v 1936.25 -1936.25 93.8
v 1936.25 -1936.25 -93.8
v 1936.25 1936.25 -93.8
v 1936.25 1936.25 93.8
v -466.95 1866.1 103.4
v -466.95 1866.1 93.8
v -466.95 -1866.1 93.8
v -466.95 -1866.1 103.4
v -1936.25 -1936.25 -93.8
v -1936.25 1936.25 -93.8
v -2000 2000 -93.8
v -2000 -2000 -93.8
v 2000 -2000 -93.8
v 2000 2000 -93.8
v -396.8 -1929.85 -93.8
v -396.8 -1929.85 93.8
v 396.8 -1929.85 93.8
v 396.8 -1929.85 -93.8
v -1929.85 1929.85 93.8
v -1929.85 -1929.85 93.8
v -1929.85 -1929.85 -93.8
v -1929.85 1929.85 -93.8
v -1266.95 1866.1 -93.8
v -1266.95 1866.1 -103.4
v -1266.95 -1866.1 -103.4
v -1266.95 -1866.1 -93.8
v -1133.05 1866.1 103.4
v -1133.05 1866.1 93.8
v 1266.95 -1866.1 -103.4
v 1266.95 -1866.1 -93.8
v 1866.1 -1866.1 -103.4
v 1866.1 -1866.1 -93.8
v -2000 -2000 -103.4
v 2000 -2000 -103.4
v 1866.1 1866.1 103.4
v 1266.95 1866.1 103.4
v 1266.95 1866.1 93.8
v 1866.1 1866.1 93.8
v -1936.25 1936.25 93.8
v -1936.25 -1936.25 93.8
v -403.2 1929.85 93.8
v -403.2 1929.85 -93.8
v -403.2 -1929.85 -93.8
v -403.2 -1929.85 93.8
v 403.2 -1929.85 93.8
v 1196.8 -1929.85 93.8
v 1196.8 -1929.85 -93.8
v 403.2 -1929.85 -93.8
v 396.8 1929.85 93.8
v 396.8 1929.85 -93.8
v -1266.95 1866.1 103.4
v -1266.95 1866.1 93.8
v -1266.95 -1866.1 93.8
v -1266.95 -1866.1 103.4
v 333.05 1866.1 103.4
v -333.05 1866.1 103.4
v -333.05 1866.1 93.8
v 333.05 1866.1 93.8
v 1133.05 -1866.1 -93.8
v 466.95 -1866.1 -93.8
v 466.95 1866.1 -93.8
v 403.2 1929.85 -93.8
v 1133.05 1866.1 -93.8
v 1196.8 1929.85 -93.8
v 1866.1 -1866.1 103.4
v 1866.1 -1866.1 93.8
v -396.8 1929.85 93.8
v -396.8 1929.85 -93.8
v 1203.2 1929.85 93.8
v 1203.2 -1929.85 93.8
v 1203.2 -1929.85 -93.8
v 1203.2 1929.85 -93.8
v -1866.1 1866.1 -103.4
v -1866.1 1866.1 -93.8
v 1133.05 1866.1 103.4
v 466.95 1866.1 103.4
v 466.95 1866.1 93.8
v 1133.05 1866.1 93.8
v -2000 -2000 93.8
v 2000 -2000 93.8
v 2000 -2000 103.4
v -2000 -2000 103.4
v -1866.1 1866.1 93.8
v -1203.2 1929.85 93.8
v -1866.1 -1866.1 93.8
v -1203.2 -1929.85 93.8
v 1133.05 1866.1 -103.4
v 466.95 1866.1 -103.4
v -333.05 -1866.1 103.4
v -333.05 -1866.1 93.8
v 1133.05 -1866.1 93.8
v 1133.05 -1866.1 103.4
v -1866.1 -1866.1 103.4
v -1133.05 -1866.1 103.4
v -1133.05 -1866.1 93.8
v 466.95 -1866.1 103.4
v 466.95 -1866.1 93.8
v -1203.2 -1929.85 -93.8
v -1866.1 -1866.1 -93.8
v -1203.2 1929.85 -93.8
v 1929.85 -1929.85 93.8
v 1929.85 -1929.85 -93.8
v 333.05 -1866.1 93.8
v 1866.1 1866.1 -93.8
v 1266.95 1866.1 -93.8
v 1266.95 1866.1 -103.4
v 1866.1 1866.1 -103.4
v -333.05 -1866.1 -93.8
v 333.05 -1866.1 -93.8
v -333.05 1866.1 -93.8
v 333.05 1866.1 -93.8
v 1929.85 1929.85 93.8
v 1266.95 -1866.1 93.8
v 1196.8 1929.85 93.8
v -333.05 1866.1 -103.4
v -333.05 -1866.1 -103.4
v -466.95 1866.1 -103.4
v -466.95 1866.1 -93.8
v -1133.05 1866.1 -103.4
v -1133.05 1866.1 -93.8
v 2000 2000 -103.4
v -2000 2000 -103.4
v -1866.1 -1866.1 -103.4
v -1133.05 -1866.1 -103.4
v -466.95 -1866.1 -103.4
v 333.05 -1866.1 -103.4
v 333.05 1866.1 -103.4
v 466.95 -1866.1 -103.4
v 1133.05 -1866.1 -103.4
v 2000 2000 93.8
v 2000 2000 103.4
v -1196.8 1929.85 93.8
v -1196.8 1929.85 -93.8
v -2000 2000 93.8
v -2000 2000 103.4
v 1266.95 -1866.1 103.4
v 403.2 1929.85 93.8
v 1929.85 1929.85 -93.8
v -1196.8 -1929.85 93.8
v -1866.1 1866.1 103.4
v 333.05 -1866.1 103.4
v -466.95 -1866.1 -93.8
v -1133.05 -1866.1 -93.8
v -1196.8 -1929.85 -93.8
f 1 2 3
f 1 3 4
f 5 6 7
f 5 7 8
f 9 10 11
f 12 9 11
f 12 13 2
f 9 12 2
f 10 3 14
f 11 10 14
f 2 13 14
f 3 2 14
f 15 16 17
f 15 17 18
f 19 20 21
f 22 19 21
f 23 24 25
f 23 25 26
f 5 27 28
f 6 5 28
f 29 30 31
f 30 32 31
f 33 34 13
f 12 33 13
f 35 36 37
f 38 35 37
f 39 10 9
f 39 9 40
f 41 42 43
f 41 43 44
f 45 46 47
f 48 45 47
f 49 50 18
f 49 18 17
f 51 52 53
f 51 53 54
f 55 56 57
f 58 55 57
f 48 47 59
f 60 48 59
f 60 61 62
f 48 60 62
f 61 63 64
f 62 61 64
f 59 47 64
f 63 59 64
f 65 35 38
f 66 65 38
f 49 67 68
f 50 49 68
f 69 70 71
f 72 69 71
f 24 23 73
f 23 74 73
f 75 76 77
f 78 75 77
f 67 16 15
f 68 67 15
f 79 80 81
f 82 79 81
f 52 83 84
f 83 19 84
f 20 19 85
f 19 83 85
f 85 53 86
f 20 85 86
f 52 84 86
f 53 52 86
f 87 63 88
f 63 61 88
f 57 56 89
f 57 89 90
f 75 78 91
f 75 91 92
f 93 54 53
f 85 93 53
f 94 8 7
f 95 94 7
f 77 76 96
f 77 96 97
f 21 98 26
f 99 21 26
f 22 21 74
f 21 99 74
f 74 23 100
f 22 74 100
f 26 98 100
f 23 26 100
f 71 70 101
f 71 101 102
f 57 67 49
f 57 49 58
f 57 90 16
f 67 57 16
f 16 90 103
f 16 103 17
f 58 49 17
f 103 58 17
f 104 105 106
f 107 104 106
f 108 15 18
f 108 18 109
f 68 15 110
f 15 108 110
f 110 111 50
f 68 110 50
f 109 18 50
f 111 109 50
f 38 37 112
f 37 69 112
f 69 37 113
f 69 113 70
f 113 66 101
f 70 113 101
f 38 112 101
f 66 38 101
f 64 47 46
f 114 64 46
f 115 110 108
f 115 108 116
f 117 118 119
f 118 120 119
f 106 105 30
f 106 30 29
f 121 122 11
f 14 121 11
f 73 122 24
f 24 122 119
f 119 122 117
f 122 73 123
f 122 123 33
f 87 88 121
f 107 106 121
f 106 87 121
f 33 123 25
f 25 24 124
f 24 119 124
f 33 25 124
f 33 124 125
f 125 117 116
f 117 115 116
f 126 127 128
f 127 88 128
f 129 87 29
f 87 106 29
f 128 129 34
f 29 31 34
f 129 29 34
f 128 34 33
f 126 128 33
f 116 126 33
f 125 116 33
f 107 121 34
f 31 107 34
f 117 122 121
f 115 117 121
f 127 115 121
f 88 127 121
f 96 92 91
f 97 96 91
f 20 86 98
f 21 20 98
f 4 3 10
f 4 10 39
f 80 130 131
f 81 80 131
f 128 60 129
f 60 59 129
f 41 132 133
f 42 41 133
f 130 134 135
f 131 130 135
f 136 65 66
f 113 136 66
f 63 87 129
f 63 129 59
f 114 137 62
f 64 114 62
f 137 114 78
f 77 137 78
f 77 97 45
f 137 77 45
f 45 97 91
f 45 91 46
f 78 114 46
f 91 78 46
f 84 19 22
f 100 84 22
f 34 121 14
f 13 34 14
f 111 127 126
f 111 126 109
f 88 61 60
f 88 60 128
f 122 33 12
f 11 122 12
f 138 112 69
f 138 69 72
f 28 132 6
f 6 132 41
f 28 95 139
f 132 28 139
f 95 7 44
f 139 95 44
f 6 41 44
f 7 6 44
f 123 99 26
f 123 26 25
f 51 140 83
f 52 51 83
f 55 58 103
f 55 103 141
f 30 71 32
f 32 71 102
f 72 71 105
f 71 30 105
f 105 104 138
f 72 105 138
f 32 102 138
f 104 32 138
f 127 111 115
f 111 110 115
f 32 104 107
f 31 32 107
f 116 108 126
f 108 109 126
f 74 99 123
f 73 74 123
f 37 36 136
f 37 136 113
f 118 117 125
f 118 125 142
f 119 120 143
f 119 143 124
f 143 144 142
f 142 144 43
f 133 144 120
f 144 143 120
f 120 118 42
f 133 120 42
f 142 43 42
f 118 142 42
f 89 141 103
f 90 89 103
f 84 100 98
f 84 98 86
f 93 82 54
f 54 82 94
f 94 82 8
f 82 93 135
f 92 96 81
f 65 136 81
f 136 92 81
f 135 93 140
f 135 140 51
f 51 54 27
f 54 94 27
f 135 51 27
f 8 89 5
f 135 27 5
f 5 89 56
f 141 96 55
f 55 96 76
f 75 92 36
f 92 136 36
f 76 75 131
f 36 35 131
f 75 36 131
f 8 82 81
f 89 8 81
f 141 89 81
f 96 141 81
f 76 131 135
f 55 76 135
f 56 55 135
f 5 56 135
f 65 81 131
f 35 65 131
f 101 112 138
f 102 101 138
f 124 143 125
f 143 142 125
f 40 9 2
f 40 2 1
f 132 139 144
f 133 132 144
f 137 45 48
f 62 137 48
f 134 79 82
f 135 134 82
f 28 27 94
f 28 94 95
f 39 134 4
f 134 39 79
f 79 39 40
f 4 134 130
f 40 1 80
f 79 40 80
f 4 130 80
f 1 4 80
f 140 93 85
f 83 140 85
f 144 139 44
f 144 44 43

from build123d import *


with BuildPart() as f2:
    # F2: sweep along a path in F0
    with BuildLine(Plane.XY) as f2_path:
        Line((-1933.05, -1933.05), (1933.05, -1933.05))
        Line((1933.05, -1933.05), (1933.05, 1933.05))
        Line((1933.05, 1933.05), (-1933.05, 1933.05))
        Line((-1933.05, 1933.05), (-1933.05, -1933.05))
    # F1 (on Front) → F2 (sweep)
    with BuildSketch(Plane.XZ):
        Polygon((2000, 103.4), (1866.1, 103.4), (1866.1, 93.8), (1929.85, 93.8), (1929.85, -93.8), (1866.1, -93.8), (1866.1, -103.4), (2000, -103.4), (2000, -93.8), (1936.25, -93.8), (1936.25, 93.8), (2000, 93.8), align=None)
    sweep(path=f2_path.line, transition=Transition.RIGHT)

    # F5: sweep along a path in F0
    with BuildLine(Plane.XY) as f5_path:
        Line((1200, -1933.05), (1200, 1933.05))
    # F4 (on offset) → F5 (sweep)
    with BuildSketch(Plane(origin=(0, 1933.05, 0), x_dir=(-1, 0, 0), z_dir=(0, 1, 0))):
        Polygon((-1133.05, 103.4), (-1266.95, 103.4), (-1266.95, 93.8), (-1203.2, 93.8), (-1203.2, -93.8), (-1266.95, -93.8), (-1266.95, -103.4), (-1133.05, -103.4), (-1133.05, -93.8), (-1196.8, -93.8), (-1196.8, 93.8), (-1133.05, 93.8), align=None)
        Polygon((-466.95, -93.8), (-466.95, -103.4), (-333.05, -103.4), (-333.05, -93.8), (-396.8, -93.8), (-396.8, 93.8), (-333.05, 93.8), (-333.05, 103.4), (-466.95, 103.4), (-466.95, 93.8), (-403.2, 93.8), (-403.2, -93.8), align=None)
        Polygon((396.8, -93.8), (333.05, -93.8), (333.05, -103.4), (466.95, -103.4), (466.95, -93.8), (403.2, -93.8), (403.2, 93.8), (466.95, 93.8), (466.95, 103.4), (333.05, 103.4), (333.05, 93.8), (396.8, 93.8), align=None)
        Polygon((1133.05, 93.8), (1196.8, 93.8), (1196.8, -93.8), (1133.05, -93.8), (1133.05, -103.4), (1266.95, -103.4), (1266.95, -93.8), (1203.2, -93.8), (1203.2, 93.8), (1266.95, 93.8), (1266.95, 103.4), (1133.05, 103.4), align=None)
    sweep(path=f5_path.line)


solid = f2.part
